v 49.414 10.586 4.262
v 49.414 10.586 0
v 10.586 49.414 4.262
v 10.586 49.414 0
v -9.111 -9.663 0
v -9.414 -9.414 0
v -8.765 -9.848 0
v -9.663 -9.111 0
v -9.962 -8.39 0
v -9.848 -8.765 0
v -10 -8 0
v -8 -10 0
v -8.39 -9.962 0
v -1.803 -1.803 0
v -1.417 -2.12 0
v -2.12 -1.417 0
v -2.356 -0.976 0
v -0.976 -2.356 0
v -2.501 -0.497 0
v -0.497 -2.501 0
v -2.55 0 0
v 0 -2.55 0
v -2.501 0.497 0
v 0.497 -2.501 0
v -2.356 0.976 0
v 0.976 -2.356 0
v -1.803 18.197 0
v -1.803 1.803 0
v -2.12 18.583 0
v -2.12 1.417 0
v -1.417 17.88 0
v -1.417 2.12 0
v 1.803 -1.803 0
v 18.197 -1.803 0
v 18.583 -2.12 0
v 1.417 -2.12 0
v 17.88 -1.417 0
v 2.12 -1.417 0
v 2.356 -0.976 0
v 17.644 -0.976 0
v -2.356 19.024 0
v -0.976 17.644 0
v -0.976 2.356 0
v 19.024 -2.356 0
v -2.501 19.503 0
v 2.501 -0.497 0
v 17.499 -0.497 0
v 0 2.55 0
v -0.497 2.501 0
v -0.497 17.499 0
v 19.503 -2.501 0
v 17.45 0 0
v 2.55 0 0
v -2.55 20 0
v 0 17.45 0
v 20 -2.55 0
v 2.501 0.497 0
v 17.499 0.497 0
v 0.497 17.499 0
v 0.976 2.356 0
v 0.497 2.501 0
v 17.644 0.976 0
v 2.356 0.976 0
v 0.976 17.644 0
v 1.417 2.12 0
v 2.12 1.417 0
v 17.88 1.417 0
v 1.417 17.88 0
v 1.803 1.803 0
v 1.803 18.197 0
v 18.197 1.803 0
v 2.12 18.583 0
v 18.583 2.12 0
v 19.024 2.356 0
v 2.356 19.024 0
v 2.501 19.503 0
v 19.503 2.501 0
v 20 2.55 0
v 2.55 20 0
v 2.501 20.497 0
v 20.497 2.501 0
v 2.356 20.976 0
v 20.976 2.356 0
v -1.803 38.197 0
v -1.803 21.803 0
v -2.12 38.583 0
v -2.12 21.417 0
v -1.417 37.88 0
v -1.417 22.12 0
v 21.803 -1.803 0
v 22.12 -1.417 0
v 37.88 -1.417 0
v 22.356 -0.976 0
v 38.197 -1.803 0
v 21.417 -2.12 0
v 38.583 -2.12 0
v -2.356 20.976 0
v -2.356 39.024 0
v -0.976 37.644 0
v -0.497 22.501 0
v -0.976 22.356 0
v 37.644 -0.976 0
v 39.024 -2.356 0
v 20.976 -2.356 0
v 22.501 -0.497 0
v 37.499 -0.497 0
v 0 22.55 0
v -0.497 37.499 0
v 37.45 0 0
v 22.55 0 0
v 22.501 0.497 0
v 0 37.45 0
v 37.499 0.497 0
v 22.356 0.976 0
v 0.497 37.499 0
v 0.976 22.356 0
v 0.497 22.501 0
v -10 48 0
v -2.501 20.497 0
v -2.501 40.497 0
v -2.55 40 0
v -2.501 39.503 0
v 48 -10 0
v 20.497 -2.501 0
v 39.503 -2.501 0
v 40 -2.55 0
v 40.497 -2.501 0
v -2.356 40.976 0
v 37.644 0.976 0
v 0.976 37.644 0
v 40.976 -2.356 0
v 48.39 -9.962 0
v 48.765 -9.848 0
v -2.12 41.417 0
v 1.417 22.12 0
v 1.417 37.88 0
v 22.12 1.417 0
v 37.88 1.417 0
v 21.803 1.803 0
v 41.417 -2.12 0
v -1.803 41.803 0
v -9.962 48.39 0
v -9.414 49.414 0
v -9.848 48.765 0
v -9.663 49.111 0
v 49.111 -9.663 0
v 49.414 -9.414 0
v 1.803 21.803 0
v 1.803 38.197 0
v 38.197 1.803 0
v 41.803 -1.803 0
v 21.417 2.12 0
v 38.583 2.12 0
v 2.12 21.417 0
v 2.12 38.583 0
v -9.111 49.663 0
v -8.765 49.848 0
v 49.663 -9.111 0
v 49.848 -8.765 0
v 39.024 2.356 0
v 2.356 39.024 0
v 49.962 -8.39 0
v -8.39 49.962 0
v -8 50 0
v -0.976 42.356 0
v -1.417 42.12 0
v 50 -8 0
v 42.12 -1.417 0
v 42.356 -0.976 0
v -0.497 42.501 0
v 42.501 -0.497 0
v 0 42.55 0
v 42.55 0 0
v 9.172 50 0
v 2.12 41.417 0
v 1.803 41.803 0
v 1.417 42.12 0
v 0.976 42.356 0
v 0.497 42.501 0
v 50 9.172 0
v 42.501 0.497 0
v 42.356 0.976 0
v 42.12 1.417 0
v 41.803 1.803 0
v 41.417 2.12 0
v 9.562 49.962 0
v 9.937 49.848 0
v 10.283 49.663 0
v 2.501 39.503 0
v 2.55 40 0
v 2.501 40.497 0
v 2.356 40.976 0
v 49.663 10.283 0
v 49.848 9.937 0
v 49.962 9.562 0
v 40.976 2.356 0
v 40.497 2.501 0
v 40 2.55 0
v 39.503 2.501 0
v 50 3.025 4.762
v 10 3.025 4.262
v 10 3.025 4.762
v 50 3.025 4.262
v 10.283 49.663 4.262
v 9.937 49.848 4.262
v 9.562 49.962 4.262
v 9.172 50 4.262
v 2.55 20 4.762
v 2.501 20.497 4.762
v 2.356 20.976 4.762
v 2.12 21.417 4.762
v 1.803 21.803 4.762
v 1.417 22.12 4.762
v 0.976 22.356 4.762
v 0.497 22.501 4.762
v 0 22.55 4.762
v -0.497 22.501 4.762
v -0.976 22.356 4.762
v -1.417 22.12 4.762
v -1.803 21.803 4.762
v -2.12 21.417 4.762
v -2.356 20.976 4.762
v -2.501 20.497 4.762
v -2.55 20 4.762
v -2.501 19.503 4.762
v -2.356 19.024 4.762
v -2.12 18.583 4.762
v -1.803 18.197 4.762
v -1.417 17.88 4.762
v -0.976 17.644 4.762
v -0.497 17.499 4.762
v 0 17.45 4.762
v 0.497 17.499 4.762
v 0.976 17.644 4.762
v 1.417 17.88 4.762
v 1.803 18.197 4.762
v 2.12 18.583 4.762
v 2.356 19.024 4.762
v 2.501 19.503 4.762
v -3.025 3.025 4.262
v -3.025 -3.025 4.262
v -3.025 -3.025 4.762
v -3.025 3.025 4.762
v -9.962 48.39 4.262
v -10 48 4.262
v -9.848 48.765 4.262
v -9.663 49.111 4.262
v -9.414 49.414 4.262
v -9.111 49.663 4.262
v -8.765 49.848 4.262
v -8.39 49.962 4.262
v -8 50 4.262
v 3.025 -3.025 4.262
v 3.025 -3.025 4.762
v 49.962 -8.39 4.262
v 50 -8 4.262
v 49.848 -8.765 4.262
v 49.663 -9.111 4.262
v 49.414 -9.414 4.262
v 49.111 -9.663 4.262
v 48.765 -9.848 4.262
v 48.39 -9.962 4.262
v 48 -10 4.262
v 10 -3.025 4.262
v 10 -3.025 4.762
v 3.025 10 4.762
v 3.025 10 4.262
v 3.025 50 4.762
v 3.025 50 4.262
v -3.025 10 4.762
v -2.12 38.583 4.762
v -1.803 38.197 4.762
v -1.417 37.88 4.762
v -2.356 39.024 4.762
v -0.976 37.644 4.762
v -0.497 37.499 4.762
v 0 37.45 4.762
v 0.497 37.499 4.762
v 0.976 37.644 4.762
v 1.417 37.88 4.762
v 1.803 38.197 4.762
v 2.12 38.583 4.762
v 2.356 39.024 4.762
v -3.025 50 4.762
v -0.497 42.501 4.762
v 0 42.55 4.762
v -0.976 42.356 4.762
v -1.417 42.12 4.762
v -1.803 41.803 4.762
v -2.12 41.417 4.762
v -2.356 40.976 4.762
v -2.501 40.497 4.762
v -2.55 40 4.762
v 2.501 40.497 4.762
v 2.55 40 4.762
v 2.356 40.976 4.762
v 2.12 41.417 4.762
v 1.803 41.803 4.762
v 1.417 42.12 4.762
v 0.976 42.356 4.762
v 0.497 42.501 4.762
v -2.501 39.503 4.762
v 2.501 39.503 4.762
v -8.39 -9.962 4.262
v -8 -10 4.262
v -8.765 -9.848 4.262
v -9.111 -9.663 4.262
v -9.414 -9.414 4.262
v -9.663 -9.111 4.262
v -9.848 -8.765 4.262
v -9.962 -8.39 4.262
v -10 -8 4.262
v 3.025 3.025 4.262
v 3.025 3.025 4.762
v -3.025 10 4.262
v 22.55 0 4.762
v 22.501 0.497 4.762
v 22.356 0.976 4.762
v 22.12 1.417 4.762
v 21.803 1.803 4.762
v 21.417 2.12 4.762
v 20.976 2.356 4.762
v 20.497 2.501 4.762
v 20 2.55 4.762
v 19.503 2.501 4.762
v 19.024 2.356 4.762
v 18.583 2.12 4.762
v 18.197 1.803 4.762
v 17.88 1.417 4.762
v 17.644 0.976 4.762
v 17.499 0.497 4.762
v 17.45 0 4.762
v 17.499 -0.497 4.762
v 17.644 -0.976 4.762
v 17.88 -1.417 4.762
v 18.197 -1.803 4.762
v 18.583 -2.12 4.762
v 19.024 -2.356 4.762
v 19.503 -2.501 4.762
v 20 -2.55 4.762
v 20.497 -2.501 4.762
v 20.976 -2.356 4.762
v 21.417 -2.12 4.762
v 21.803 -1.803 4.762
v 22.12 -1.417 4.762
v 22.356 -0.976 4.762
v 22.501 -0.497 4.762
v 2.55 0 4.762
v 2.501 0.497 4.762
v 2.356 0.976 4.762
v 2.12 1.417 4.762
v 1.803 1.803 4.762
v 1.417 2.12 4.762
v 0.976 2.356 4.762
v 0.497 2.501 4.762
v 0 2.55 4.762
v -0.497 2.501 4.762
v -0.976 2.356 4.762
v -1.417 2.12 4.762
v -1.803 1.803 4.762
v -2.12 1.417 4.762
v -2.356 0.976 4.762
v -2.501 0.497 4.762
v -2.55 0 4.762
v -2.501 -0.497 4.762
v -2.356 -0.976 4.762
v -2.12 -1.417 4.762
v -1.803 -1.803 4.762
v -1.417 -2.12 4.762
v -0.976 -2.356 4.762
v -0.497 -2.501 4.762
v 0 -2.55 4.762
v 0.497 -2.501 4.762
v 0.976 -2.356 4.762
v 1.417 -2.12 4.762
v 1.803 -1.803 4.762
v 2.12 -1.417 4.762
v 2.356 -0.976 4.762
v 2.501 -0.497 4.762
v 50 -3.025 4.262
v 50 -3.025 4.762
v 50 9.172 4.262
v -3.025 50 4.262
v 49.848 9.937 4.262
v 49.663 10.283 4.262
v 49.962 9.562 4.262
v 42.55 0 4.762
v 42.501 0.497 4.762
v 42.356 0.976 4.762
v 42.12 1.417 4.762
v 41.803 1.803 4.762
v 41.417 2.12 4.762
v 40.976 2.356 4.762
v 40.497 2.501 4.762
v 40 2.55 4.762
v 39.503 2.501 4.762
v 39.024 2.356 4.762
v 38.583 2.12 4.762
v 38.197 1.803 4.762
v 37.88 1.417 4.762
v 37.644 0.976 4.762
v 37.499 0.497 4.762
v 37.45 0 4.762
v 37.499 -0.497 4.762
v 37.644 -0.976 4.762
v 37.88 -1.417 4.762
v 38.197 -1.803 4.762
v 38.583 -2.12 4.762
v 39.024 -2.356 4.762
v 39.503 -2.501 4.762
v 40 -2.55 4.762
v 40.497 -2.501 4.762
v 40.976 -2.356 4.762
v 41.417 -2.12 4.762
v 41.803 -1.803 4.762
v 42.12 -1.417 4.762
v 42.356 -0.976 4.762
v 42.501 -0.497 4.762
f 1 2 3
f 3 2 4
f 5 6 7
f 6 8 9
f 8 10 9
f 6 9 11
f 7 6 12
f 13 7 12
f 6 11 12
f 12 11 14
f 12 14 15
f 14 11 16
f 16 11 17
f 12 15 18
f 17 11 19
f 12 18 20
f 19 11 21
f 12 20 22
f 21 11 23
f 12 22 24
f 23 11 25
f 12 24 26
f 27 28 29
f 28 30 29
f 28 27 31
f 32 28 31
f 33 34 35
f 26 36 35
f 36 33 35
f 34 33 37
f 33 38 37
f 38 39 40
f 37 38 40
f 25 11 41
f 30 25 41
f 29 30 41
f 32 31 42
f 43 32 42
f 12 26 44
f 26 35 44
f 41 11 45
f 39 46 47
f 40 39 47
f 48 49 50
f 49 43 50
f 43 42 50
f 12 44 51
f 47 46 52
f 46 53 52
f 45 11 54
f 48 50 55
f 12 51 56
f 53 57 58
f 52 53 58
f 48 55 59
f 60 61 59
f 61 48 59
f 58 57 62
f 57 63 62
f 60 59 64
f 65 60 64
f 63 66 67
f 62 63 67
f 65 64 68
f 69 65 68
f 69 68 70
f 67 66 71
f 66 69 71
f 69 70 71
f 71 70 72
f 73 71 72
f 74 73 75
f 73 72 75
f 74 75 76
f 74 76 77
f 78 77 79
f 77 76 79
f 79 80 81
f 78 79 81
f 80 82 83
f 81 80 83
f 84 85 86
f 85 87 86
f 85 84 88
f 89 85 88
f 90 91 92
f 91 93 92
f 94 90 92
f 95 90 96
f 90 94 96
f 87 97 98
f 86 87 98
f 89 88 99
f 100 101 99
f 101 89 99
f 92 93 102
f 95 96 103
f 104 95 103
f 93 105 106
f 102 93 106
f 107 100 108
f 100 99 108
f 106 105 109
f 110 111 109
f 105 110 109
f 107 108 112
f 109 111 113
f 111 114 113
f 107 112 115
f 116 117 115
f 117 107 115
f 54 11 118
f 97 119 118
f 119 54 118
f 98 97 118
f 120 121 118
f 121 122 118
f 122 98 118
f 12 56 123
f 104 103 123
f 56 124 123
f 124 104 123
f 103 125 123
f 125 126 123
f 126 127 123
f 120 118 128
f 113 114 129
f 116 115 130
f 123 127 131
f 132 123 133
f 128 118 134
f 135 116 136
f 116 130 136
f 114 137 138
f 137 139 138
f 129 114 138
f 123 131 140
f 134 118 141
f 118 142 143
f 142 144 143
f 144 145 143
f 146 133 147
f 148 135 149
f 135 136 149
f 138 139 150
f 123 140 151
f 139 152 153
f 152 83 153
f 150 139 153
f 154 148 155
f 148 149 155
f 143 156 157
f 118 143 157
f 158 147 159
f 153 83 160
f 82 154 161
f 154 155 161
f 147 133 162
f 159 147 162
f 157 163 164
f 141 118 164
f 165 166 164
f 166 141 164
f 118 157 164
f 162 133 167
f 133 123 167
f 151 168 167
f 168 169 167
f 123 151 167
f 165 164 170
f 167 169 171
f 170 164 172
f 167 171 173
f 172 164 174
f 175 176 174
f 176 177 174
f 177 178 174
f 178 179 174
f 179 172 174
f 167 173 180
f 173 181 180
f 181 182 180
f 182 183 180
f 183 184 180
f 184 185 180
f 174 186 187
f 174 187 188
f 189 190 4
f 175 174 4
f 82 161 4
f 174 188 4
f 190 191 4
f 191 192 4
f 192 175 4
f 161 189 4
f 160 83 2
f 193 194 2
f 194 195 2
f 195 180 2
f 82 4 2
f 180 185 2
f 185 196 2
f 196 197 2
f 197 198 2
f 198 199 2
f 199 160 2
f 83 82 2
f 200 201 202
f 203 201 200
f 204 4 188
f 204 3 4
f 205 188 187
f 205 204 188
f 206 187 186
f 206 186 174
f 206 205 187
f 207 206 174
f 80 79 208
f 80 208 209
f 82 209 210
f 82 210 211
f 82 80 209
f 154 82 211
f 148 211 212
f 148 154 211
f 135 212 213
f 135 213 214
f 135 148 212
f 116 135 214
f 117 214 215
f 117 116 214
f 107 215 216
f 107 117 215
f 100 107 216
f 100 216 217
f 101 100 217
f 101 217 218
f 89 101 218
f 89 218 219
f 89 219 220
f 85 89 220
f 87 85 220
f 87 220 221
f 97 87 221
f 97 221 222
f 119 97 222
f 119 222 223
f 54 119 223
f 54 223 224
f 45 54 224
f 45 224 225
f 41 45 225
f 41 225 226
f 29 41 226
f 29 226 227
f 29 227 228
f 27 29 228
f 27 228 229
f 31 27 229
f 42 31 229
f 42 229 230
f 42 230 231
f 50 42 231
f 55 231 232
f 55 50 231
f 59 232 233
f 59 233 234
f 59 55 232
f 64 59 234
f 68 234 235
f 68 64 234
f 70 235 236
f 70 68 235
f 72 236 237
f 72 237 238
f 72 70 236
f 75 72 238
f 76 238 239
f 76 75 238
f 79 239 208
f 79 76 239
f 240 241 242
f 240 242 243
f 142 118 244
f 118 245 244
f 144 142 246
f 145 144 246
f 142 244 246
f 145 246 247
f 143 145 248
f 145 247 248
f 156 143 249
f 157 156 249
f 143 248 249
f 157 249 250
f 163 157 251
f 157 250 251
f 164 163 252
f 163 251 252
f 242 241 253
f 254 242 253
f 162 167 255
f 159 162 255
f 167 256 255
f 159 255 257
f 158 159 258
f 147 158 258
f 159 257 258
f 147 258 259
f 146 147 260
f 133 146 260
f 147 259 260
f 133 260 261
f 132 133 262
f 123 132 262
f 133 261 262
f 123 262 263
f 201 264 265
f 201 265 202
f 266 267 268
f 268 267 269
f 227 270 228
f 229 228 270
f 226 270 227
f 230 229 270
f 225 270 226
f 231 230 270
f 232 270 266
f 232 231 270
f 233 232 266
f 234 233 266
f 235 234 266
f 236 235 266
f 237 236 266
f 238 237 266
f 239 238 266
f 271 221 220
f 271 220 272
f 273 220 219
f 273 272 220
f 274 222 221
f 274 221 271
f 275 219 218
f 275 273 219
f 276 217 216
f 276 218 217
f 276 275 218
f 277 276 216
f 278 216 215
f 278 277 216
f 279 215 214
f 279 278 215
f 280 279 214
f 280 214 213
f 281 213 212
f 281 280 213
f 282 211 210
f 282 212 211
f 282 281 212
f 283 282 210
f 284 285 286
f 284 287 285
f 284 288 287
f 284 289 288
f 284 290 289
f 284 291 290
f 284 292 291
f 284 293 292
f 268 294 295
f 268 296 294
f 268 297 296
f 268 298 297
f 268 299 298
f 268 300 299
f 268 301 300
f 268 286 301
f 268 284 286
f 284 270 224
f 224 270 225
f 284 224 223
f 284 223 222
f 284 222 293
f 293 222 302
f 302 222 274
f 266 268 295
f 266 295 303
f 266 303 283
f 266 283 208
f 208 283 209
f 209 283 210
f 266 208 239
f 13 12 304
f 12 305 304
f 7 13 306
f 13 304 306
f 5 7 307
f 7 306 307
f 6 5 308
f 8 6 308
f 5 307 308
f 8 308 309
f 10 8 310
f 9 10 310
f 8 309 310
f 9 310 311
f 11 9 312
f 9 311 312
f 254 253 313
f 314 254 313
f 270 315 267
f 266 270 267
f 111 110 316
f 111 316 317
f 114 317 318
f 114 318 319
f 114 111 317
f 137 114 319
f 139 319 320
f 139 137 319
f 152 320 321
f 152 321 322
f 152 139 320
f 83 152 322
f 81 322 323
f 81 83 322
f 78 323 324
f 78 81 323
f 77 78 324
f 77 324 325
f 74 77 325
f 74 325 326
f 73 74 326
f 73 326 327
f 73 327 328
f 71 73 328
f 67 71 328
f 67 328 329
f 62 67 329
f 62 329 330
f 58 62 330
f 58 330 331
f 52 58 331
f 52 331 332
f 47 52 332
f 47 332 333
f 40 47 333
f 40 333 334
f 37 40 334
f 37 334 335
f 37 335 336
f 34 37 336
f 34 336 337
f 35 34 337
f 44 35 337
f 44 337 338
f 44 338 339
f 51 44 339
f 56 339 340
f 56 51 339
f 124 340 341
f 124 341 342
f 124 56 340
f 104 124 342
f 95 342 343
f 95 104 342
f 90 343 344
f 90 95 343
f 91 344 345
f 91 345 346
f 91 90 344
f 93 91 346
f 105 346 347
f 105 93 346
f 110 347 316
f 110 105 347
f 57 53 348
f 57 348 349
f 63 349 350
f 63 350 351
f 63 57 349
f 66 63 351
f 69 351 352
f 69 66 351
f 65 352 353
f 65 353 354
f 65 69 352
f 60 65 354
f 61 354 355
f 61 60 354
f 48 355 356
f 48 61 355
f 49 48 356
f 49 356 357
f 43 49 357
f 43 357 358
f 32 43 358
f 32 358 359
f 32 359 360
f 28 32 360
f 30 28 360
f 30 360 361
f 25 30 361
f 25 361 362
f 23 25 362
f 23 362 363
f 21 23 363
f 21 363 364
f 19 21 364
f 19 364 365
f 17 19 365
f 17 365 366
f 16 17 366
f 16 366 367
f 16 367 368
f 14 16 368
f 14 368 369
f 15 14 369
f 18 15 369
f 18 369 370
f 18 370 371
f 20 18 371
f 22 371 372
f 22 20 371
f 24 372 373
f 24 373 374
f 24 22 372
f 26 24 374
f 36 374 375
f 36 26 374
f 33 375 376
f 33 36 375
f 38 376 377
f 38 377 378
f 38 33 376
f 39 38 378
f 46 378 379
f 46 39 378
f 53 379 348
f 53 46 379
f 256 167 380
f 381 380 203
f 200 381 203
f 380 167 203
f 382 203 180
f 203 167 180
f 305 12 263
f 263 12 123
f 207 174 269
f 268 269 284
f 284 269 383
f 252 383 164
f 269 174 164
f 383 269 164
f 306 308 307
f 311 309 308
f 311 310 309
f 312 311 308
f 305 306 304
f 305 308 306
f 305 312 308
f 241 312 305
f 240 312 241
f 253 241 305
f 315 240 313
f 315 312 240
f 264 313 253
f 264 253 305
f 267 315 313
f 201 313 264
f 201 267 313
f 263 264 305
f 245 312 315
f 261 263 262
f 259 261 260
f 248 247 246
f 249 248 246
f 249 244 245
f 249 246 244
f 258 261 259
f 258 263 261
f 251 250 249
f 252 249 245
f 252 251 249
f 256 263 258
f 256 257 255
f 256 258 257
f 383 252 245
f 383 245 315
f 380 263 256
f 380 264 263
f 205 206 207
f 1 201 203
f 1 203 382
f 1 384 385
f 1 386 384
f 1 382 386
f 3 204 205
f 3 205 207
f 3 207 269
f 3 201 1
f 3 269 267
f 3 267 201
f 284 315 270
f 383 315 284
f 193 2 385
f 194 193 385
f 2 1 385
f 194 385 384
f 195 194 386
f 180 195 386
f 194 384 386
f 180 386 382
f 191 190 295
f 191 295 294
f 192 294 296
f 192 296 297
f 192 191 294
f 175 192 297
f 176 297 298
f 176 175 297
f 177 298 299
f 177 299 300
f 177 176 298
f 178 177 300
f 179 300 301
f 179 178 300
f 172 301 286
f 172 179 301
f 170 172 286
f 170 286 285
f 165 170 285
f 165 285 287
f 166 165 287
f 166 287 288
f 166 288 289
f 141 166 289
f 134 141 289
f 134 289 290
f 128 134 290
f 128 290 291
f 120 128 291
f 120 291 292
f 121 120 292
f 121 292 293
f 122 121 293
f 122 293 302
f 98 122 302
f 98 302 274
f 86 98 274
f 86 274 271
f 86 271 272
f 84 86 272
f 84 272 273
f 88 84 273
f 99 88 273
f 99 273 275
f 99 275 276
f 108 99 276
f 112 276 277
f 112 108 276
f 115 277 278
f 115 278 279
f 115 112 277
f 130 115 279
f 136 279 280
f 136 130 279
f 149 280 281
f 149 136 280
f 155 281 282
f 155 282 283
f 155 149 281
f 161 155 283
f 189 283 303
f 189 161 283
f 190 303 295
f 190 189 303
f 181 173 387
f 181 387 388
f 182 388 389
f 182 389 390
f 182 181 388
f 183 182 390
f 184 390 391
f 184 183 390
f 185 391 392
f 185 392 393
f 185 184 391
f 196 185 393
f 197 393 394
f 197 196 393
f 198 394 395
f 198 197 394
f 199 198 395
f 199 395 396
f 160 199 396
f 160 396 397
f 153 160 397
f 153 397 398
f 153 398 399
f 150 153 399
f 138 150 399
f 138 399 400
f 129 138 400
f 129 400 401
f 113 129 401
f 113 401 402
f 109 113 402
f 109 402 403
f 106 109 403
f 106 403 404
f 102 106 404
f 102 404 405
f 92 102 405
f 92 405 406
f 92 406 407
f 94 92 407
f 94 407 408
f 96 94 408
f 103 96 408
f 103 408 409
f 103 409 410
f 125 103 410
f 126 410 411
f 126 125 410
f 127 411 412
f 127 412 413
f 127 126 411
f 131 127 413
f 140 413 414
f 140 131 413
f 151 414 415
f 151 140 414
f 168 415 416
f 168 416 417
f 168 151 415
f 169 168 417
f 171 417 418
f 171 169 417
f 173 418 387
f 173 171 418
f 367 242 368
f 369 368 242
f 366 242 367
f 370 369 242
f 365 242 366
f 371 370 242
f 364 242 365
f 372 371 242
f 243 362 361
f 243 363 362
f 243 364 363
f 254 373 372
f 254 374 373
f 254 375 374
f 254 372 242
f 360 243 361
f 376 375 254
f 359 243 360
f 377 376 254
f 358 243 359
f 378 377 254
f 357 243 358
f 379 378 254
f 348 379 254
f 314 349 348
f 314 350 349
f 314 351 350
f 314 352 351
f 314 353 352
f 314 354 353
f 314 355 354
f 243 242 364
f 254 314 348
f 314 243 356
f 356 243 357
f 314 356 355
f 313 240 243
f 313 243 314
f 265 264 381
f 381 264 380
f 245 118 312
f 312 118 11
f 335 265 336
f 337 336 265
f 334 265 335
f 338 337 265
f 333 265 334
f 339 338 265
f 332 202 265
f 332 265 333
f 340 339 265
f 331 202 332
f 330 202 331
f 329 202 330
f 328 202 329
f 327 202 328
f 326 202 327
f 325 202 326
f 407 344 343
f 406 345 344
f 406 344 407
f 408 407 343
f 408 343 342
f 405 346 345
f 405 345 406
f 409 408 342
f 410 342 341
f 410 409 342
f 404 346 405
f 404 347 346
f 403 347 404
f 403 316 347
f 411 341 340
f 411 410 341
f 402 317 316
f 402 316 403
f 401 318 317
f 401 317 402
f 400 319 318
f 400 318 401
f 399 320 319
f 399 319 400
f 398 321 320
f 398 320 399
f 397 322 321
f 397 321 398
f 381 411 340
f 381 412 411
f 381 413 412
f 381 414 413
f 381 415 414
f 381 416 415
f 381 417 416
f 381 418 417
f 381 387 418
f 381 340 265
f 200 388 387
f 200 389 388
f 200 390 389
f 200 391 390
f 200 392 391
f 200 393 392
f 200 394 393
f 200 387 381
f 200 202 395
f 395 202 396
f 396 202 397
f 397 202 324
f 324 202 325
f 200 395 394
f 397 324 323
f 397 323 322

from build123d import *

# Parameters (mm, degrees)
F2_W     = 6.975
F2_H     = 40
F2_H_2   = 6.975
F2_W_2   = 6.05
F2_R     = 2.55
F2_H_3   = 6.05
F2_W_3   = 40
F3_DEPTH = 4.2625
F4_DEPTH = 4.7625
F5_R     = 2


with BuildPart() as f3:
    # F2 (on Top) → F3 (new body)
    with BuildSketch(Plane.XY):
        with Locations((-6.5125, 30)):
            Rectangle(F2_W, F2_H)
        with Locations((-6.5125, 6.5125)):
            Rectangle(F2_W, F2_H_2)
        with Locations((0, 30)):
            Rectangle(F2_W_2, F2_H)
        with Locations((0, 20)):
            Circle(F2_R, mode=Mode.SUBTRACT)
        with Locations((0, 40)):
            Circle(F2_R, mode=Mode.SUBTRACT)
        with Locations((-6.5125, 0)):
            Rectangle(F2_W, F2_H_3)
        with Locations((6.5125, 30)):
            Rectangle(F2_W, F2_H)
        with Locations((-6.5125, -6.5125)):
            Rectangle(F2_W, F2_H_2)
        Polygon((50, 10), (10, 50), (10, 10), align=None)
        with Locations((0, -6.5125)):
            Rectangle(F2_W_2, F2_H_2)
        with Locations((30, 6.5125)):
            Rectangle(F2_W_3, F2_H_2)
        with Locations((6.5125, -6.5125)):
            Rectangle(F2_W, F2_H_2)
        with Locations((30, 0)):
            Rectangle(F2_W_3, F2_H_3)
        with Locations((20, 0)):
            Circle(F2_R, mode=Mode.SUBTRACT)
        with Locations((40, 0)):
            Circle(F2_R, mode=Mode.SUBTRACT)
        with Locations((30, -6.5125)):
            Rectangle(F2_W_3, F2_H_2)
        with Locations((6.5125, 6.5125)):
            Rectangle(F2_W, F2_H_2)
        with Locations((6.5125, 0)):
            Rectangle(F2_W, F2_H_3)
        Rectangle(F2_W_2, F2_H_3)
        Circle(F2_R, mode=Mode.SUBTRACT)
        with Locations((0, 6.5125)):
            Rectangle(F2_W_2, F2_H_2)
    extrude(amount=F3_DEPTH)

    # F2 (on Top) → F4 (join)
    with BuildSketch(Plane.XY):
        Rectangle(F2_W_2, F2_H_3)
        Circle(F2_R, mode=Mode.SUBTRACT)
        with Locations((30, 0)):
            Rectangle(F2_W_3, F2_H_3)
        with Locations((20, 0)):
            Circle(F2_R, mode=Mode.SUBTRACT)
        with Locations((40, 0)):
            Circle(F2_R, mode=Mode.SUBTRACT)
        with Locations((0, 30)):
            Rectangle(F2_W_2, F2_H)
        with Locations((0, 20)):
            Circle(F2_R, mode=Mode.SUBTRACT)
        with Locations((0, 40)):
            Circle(F2_R, mode=Mode.SUBTRACT)
    extrude(amount=F4_DEPTH)

    # F5
    f5_edges = [f3.edges().sort_by_distance(p)[0] for p in [
        (50, 10, 2.13125),
        (50, -10, 2.13125),
        (-10, -10, 2.13125),
        (-10, 50, 2.13125),
        (10, 50, 2.13125),
    ]]
    fillet(f5_edges, radius=F5_R)


solid = f3.part
